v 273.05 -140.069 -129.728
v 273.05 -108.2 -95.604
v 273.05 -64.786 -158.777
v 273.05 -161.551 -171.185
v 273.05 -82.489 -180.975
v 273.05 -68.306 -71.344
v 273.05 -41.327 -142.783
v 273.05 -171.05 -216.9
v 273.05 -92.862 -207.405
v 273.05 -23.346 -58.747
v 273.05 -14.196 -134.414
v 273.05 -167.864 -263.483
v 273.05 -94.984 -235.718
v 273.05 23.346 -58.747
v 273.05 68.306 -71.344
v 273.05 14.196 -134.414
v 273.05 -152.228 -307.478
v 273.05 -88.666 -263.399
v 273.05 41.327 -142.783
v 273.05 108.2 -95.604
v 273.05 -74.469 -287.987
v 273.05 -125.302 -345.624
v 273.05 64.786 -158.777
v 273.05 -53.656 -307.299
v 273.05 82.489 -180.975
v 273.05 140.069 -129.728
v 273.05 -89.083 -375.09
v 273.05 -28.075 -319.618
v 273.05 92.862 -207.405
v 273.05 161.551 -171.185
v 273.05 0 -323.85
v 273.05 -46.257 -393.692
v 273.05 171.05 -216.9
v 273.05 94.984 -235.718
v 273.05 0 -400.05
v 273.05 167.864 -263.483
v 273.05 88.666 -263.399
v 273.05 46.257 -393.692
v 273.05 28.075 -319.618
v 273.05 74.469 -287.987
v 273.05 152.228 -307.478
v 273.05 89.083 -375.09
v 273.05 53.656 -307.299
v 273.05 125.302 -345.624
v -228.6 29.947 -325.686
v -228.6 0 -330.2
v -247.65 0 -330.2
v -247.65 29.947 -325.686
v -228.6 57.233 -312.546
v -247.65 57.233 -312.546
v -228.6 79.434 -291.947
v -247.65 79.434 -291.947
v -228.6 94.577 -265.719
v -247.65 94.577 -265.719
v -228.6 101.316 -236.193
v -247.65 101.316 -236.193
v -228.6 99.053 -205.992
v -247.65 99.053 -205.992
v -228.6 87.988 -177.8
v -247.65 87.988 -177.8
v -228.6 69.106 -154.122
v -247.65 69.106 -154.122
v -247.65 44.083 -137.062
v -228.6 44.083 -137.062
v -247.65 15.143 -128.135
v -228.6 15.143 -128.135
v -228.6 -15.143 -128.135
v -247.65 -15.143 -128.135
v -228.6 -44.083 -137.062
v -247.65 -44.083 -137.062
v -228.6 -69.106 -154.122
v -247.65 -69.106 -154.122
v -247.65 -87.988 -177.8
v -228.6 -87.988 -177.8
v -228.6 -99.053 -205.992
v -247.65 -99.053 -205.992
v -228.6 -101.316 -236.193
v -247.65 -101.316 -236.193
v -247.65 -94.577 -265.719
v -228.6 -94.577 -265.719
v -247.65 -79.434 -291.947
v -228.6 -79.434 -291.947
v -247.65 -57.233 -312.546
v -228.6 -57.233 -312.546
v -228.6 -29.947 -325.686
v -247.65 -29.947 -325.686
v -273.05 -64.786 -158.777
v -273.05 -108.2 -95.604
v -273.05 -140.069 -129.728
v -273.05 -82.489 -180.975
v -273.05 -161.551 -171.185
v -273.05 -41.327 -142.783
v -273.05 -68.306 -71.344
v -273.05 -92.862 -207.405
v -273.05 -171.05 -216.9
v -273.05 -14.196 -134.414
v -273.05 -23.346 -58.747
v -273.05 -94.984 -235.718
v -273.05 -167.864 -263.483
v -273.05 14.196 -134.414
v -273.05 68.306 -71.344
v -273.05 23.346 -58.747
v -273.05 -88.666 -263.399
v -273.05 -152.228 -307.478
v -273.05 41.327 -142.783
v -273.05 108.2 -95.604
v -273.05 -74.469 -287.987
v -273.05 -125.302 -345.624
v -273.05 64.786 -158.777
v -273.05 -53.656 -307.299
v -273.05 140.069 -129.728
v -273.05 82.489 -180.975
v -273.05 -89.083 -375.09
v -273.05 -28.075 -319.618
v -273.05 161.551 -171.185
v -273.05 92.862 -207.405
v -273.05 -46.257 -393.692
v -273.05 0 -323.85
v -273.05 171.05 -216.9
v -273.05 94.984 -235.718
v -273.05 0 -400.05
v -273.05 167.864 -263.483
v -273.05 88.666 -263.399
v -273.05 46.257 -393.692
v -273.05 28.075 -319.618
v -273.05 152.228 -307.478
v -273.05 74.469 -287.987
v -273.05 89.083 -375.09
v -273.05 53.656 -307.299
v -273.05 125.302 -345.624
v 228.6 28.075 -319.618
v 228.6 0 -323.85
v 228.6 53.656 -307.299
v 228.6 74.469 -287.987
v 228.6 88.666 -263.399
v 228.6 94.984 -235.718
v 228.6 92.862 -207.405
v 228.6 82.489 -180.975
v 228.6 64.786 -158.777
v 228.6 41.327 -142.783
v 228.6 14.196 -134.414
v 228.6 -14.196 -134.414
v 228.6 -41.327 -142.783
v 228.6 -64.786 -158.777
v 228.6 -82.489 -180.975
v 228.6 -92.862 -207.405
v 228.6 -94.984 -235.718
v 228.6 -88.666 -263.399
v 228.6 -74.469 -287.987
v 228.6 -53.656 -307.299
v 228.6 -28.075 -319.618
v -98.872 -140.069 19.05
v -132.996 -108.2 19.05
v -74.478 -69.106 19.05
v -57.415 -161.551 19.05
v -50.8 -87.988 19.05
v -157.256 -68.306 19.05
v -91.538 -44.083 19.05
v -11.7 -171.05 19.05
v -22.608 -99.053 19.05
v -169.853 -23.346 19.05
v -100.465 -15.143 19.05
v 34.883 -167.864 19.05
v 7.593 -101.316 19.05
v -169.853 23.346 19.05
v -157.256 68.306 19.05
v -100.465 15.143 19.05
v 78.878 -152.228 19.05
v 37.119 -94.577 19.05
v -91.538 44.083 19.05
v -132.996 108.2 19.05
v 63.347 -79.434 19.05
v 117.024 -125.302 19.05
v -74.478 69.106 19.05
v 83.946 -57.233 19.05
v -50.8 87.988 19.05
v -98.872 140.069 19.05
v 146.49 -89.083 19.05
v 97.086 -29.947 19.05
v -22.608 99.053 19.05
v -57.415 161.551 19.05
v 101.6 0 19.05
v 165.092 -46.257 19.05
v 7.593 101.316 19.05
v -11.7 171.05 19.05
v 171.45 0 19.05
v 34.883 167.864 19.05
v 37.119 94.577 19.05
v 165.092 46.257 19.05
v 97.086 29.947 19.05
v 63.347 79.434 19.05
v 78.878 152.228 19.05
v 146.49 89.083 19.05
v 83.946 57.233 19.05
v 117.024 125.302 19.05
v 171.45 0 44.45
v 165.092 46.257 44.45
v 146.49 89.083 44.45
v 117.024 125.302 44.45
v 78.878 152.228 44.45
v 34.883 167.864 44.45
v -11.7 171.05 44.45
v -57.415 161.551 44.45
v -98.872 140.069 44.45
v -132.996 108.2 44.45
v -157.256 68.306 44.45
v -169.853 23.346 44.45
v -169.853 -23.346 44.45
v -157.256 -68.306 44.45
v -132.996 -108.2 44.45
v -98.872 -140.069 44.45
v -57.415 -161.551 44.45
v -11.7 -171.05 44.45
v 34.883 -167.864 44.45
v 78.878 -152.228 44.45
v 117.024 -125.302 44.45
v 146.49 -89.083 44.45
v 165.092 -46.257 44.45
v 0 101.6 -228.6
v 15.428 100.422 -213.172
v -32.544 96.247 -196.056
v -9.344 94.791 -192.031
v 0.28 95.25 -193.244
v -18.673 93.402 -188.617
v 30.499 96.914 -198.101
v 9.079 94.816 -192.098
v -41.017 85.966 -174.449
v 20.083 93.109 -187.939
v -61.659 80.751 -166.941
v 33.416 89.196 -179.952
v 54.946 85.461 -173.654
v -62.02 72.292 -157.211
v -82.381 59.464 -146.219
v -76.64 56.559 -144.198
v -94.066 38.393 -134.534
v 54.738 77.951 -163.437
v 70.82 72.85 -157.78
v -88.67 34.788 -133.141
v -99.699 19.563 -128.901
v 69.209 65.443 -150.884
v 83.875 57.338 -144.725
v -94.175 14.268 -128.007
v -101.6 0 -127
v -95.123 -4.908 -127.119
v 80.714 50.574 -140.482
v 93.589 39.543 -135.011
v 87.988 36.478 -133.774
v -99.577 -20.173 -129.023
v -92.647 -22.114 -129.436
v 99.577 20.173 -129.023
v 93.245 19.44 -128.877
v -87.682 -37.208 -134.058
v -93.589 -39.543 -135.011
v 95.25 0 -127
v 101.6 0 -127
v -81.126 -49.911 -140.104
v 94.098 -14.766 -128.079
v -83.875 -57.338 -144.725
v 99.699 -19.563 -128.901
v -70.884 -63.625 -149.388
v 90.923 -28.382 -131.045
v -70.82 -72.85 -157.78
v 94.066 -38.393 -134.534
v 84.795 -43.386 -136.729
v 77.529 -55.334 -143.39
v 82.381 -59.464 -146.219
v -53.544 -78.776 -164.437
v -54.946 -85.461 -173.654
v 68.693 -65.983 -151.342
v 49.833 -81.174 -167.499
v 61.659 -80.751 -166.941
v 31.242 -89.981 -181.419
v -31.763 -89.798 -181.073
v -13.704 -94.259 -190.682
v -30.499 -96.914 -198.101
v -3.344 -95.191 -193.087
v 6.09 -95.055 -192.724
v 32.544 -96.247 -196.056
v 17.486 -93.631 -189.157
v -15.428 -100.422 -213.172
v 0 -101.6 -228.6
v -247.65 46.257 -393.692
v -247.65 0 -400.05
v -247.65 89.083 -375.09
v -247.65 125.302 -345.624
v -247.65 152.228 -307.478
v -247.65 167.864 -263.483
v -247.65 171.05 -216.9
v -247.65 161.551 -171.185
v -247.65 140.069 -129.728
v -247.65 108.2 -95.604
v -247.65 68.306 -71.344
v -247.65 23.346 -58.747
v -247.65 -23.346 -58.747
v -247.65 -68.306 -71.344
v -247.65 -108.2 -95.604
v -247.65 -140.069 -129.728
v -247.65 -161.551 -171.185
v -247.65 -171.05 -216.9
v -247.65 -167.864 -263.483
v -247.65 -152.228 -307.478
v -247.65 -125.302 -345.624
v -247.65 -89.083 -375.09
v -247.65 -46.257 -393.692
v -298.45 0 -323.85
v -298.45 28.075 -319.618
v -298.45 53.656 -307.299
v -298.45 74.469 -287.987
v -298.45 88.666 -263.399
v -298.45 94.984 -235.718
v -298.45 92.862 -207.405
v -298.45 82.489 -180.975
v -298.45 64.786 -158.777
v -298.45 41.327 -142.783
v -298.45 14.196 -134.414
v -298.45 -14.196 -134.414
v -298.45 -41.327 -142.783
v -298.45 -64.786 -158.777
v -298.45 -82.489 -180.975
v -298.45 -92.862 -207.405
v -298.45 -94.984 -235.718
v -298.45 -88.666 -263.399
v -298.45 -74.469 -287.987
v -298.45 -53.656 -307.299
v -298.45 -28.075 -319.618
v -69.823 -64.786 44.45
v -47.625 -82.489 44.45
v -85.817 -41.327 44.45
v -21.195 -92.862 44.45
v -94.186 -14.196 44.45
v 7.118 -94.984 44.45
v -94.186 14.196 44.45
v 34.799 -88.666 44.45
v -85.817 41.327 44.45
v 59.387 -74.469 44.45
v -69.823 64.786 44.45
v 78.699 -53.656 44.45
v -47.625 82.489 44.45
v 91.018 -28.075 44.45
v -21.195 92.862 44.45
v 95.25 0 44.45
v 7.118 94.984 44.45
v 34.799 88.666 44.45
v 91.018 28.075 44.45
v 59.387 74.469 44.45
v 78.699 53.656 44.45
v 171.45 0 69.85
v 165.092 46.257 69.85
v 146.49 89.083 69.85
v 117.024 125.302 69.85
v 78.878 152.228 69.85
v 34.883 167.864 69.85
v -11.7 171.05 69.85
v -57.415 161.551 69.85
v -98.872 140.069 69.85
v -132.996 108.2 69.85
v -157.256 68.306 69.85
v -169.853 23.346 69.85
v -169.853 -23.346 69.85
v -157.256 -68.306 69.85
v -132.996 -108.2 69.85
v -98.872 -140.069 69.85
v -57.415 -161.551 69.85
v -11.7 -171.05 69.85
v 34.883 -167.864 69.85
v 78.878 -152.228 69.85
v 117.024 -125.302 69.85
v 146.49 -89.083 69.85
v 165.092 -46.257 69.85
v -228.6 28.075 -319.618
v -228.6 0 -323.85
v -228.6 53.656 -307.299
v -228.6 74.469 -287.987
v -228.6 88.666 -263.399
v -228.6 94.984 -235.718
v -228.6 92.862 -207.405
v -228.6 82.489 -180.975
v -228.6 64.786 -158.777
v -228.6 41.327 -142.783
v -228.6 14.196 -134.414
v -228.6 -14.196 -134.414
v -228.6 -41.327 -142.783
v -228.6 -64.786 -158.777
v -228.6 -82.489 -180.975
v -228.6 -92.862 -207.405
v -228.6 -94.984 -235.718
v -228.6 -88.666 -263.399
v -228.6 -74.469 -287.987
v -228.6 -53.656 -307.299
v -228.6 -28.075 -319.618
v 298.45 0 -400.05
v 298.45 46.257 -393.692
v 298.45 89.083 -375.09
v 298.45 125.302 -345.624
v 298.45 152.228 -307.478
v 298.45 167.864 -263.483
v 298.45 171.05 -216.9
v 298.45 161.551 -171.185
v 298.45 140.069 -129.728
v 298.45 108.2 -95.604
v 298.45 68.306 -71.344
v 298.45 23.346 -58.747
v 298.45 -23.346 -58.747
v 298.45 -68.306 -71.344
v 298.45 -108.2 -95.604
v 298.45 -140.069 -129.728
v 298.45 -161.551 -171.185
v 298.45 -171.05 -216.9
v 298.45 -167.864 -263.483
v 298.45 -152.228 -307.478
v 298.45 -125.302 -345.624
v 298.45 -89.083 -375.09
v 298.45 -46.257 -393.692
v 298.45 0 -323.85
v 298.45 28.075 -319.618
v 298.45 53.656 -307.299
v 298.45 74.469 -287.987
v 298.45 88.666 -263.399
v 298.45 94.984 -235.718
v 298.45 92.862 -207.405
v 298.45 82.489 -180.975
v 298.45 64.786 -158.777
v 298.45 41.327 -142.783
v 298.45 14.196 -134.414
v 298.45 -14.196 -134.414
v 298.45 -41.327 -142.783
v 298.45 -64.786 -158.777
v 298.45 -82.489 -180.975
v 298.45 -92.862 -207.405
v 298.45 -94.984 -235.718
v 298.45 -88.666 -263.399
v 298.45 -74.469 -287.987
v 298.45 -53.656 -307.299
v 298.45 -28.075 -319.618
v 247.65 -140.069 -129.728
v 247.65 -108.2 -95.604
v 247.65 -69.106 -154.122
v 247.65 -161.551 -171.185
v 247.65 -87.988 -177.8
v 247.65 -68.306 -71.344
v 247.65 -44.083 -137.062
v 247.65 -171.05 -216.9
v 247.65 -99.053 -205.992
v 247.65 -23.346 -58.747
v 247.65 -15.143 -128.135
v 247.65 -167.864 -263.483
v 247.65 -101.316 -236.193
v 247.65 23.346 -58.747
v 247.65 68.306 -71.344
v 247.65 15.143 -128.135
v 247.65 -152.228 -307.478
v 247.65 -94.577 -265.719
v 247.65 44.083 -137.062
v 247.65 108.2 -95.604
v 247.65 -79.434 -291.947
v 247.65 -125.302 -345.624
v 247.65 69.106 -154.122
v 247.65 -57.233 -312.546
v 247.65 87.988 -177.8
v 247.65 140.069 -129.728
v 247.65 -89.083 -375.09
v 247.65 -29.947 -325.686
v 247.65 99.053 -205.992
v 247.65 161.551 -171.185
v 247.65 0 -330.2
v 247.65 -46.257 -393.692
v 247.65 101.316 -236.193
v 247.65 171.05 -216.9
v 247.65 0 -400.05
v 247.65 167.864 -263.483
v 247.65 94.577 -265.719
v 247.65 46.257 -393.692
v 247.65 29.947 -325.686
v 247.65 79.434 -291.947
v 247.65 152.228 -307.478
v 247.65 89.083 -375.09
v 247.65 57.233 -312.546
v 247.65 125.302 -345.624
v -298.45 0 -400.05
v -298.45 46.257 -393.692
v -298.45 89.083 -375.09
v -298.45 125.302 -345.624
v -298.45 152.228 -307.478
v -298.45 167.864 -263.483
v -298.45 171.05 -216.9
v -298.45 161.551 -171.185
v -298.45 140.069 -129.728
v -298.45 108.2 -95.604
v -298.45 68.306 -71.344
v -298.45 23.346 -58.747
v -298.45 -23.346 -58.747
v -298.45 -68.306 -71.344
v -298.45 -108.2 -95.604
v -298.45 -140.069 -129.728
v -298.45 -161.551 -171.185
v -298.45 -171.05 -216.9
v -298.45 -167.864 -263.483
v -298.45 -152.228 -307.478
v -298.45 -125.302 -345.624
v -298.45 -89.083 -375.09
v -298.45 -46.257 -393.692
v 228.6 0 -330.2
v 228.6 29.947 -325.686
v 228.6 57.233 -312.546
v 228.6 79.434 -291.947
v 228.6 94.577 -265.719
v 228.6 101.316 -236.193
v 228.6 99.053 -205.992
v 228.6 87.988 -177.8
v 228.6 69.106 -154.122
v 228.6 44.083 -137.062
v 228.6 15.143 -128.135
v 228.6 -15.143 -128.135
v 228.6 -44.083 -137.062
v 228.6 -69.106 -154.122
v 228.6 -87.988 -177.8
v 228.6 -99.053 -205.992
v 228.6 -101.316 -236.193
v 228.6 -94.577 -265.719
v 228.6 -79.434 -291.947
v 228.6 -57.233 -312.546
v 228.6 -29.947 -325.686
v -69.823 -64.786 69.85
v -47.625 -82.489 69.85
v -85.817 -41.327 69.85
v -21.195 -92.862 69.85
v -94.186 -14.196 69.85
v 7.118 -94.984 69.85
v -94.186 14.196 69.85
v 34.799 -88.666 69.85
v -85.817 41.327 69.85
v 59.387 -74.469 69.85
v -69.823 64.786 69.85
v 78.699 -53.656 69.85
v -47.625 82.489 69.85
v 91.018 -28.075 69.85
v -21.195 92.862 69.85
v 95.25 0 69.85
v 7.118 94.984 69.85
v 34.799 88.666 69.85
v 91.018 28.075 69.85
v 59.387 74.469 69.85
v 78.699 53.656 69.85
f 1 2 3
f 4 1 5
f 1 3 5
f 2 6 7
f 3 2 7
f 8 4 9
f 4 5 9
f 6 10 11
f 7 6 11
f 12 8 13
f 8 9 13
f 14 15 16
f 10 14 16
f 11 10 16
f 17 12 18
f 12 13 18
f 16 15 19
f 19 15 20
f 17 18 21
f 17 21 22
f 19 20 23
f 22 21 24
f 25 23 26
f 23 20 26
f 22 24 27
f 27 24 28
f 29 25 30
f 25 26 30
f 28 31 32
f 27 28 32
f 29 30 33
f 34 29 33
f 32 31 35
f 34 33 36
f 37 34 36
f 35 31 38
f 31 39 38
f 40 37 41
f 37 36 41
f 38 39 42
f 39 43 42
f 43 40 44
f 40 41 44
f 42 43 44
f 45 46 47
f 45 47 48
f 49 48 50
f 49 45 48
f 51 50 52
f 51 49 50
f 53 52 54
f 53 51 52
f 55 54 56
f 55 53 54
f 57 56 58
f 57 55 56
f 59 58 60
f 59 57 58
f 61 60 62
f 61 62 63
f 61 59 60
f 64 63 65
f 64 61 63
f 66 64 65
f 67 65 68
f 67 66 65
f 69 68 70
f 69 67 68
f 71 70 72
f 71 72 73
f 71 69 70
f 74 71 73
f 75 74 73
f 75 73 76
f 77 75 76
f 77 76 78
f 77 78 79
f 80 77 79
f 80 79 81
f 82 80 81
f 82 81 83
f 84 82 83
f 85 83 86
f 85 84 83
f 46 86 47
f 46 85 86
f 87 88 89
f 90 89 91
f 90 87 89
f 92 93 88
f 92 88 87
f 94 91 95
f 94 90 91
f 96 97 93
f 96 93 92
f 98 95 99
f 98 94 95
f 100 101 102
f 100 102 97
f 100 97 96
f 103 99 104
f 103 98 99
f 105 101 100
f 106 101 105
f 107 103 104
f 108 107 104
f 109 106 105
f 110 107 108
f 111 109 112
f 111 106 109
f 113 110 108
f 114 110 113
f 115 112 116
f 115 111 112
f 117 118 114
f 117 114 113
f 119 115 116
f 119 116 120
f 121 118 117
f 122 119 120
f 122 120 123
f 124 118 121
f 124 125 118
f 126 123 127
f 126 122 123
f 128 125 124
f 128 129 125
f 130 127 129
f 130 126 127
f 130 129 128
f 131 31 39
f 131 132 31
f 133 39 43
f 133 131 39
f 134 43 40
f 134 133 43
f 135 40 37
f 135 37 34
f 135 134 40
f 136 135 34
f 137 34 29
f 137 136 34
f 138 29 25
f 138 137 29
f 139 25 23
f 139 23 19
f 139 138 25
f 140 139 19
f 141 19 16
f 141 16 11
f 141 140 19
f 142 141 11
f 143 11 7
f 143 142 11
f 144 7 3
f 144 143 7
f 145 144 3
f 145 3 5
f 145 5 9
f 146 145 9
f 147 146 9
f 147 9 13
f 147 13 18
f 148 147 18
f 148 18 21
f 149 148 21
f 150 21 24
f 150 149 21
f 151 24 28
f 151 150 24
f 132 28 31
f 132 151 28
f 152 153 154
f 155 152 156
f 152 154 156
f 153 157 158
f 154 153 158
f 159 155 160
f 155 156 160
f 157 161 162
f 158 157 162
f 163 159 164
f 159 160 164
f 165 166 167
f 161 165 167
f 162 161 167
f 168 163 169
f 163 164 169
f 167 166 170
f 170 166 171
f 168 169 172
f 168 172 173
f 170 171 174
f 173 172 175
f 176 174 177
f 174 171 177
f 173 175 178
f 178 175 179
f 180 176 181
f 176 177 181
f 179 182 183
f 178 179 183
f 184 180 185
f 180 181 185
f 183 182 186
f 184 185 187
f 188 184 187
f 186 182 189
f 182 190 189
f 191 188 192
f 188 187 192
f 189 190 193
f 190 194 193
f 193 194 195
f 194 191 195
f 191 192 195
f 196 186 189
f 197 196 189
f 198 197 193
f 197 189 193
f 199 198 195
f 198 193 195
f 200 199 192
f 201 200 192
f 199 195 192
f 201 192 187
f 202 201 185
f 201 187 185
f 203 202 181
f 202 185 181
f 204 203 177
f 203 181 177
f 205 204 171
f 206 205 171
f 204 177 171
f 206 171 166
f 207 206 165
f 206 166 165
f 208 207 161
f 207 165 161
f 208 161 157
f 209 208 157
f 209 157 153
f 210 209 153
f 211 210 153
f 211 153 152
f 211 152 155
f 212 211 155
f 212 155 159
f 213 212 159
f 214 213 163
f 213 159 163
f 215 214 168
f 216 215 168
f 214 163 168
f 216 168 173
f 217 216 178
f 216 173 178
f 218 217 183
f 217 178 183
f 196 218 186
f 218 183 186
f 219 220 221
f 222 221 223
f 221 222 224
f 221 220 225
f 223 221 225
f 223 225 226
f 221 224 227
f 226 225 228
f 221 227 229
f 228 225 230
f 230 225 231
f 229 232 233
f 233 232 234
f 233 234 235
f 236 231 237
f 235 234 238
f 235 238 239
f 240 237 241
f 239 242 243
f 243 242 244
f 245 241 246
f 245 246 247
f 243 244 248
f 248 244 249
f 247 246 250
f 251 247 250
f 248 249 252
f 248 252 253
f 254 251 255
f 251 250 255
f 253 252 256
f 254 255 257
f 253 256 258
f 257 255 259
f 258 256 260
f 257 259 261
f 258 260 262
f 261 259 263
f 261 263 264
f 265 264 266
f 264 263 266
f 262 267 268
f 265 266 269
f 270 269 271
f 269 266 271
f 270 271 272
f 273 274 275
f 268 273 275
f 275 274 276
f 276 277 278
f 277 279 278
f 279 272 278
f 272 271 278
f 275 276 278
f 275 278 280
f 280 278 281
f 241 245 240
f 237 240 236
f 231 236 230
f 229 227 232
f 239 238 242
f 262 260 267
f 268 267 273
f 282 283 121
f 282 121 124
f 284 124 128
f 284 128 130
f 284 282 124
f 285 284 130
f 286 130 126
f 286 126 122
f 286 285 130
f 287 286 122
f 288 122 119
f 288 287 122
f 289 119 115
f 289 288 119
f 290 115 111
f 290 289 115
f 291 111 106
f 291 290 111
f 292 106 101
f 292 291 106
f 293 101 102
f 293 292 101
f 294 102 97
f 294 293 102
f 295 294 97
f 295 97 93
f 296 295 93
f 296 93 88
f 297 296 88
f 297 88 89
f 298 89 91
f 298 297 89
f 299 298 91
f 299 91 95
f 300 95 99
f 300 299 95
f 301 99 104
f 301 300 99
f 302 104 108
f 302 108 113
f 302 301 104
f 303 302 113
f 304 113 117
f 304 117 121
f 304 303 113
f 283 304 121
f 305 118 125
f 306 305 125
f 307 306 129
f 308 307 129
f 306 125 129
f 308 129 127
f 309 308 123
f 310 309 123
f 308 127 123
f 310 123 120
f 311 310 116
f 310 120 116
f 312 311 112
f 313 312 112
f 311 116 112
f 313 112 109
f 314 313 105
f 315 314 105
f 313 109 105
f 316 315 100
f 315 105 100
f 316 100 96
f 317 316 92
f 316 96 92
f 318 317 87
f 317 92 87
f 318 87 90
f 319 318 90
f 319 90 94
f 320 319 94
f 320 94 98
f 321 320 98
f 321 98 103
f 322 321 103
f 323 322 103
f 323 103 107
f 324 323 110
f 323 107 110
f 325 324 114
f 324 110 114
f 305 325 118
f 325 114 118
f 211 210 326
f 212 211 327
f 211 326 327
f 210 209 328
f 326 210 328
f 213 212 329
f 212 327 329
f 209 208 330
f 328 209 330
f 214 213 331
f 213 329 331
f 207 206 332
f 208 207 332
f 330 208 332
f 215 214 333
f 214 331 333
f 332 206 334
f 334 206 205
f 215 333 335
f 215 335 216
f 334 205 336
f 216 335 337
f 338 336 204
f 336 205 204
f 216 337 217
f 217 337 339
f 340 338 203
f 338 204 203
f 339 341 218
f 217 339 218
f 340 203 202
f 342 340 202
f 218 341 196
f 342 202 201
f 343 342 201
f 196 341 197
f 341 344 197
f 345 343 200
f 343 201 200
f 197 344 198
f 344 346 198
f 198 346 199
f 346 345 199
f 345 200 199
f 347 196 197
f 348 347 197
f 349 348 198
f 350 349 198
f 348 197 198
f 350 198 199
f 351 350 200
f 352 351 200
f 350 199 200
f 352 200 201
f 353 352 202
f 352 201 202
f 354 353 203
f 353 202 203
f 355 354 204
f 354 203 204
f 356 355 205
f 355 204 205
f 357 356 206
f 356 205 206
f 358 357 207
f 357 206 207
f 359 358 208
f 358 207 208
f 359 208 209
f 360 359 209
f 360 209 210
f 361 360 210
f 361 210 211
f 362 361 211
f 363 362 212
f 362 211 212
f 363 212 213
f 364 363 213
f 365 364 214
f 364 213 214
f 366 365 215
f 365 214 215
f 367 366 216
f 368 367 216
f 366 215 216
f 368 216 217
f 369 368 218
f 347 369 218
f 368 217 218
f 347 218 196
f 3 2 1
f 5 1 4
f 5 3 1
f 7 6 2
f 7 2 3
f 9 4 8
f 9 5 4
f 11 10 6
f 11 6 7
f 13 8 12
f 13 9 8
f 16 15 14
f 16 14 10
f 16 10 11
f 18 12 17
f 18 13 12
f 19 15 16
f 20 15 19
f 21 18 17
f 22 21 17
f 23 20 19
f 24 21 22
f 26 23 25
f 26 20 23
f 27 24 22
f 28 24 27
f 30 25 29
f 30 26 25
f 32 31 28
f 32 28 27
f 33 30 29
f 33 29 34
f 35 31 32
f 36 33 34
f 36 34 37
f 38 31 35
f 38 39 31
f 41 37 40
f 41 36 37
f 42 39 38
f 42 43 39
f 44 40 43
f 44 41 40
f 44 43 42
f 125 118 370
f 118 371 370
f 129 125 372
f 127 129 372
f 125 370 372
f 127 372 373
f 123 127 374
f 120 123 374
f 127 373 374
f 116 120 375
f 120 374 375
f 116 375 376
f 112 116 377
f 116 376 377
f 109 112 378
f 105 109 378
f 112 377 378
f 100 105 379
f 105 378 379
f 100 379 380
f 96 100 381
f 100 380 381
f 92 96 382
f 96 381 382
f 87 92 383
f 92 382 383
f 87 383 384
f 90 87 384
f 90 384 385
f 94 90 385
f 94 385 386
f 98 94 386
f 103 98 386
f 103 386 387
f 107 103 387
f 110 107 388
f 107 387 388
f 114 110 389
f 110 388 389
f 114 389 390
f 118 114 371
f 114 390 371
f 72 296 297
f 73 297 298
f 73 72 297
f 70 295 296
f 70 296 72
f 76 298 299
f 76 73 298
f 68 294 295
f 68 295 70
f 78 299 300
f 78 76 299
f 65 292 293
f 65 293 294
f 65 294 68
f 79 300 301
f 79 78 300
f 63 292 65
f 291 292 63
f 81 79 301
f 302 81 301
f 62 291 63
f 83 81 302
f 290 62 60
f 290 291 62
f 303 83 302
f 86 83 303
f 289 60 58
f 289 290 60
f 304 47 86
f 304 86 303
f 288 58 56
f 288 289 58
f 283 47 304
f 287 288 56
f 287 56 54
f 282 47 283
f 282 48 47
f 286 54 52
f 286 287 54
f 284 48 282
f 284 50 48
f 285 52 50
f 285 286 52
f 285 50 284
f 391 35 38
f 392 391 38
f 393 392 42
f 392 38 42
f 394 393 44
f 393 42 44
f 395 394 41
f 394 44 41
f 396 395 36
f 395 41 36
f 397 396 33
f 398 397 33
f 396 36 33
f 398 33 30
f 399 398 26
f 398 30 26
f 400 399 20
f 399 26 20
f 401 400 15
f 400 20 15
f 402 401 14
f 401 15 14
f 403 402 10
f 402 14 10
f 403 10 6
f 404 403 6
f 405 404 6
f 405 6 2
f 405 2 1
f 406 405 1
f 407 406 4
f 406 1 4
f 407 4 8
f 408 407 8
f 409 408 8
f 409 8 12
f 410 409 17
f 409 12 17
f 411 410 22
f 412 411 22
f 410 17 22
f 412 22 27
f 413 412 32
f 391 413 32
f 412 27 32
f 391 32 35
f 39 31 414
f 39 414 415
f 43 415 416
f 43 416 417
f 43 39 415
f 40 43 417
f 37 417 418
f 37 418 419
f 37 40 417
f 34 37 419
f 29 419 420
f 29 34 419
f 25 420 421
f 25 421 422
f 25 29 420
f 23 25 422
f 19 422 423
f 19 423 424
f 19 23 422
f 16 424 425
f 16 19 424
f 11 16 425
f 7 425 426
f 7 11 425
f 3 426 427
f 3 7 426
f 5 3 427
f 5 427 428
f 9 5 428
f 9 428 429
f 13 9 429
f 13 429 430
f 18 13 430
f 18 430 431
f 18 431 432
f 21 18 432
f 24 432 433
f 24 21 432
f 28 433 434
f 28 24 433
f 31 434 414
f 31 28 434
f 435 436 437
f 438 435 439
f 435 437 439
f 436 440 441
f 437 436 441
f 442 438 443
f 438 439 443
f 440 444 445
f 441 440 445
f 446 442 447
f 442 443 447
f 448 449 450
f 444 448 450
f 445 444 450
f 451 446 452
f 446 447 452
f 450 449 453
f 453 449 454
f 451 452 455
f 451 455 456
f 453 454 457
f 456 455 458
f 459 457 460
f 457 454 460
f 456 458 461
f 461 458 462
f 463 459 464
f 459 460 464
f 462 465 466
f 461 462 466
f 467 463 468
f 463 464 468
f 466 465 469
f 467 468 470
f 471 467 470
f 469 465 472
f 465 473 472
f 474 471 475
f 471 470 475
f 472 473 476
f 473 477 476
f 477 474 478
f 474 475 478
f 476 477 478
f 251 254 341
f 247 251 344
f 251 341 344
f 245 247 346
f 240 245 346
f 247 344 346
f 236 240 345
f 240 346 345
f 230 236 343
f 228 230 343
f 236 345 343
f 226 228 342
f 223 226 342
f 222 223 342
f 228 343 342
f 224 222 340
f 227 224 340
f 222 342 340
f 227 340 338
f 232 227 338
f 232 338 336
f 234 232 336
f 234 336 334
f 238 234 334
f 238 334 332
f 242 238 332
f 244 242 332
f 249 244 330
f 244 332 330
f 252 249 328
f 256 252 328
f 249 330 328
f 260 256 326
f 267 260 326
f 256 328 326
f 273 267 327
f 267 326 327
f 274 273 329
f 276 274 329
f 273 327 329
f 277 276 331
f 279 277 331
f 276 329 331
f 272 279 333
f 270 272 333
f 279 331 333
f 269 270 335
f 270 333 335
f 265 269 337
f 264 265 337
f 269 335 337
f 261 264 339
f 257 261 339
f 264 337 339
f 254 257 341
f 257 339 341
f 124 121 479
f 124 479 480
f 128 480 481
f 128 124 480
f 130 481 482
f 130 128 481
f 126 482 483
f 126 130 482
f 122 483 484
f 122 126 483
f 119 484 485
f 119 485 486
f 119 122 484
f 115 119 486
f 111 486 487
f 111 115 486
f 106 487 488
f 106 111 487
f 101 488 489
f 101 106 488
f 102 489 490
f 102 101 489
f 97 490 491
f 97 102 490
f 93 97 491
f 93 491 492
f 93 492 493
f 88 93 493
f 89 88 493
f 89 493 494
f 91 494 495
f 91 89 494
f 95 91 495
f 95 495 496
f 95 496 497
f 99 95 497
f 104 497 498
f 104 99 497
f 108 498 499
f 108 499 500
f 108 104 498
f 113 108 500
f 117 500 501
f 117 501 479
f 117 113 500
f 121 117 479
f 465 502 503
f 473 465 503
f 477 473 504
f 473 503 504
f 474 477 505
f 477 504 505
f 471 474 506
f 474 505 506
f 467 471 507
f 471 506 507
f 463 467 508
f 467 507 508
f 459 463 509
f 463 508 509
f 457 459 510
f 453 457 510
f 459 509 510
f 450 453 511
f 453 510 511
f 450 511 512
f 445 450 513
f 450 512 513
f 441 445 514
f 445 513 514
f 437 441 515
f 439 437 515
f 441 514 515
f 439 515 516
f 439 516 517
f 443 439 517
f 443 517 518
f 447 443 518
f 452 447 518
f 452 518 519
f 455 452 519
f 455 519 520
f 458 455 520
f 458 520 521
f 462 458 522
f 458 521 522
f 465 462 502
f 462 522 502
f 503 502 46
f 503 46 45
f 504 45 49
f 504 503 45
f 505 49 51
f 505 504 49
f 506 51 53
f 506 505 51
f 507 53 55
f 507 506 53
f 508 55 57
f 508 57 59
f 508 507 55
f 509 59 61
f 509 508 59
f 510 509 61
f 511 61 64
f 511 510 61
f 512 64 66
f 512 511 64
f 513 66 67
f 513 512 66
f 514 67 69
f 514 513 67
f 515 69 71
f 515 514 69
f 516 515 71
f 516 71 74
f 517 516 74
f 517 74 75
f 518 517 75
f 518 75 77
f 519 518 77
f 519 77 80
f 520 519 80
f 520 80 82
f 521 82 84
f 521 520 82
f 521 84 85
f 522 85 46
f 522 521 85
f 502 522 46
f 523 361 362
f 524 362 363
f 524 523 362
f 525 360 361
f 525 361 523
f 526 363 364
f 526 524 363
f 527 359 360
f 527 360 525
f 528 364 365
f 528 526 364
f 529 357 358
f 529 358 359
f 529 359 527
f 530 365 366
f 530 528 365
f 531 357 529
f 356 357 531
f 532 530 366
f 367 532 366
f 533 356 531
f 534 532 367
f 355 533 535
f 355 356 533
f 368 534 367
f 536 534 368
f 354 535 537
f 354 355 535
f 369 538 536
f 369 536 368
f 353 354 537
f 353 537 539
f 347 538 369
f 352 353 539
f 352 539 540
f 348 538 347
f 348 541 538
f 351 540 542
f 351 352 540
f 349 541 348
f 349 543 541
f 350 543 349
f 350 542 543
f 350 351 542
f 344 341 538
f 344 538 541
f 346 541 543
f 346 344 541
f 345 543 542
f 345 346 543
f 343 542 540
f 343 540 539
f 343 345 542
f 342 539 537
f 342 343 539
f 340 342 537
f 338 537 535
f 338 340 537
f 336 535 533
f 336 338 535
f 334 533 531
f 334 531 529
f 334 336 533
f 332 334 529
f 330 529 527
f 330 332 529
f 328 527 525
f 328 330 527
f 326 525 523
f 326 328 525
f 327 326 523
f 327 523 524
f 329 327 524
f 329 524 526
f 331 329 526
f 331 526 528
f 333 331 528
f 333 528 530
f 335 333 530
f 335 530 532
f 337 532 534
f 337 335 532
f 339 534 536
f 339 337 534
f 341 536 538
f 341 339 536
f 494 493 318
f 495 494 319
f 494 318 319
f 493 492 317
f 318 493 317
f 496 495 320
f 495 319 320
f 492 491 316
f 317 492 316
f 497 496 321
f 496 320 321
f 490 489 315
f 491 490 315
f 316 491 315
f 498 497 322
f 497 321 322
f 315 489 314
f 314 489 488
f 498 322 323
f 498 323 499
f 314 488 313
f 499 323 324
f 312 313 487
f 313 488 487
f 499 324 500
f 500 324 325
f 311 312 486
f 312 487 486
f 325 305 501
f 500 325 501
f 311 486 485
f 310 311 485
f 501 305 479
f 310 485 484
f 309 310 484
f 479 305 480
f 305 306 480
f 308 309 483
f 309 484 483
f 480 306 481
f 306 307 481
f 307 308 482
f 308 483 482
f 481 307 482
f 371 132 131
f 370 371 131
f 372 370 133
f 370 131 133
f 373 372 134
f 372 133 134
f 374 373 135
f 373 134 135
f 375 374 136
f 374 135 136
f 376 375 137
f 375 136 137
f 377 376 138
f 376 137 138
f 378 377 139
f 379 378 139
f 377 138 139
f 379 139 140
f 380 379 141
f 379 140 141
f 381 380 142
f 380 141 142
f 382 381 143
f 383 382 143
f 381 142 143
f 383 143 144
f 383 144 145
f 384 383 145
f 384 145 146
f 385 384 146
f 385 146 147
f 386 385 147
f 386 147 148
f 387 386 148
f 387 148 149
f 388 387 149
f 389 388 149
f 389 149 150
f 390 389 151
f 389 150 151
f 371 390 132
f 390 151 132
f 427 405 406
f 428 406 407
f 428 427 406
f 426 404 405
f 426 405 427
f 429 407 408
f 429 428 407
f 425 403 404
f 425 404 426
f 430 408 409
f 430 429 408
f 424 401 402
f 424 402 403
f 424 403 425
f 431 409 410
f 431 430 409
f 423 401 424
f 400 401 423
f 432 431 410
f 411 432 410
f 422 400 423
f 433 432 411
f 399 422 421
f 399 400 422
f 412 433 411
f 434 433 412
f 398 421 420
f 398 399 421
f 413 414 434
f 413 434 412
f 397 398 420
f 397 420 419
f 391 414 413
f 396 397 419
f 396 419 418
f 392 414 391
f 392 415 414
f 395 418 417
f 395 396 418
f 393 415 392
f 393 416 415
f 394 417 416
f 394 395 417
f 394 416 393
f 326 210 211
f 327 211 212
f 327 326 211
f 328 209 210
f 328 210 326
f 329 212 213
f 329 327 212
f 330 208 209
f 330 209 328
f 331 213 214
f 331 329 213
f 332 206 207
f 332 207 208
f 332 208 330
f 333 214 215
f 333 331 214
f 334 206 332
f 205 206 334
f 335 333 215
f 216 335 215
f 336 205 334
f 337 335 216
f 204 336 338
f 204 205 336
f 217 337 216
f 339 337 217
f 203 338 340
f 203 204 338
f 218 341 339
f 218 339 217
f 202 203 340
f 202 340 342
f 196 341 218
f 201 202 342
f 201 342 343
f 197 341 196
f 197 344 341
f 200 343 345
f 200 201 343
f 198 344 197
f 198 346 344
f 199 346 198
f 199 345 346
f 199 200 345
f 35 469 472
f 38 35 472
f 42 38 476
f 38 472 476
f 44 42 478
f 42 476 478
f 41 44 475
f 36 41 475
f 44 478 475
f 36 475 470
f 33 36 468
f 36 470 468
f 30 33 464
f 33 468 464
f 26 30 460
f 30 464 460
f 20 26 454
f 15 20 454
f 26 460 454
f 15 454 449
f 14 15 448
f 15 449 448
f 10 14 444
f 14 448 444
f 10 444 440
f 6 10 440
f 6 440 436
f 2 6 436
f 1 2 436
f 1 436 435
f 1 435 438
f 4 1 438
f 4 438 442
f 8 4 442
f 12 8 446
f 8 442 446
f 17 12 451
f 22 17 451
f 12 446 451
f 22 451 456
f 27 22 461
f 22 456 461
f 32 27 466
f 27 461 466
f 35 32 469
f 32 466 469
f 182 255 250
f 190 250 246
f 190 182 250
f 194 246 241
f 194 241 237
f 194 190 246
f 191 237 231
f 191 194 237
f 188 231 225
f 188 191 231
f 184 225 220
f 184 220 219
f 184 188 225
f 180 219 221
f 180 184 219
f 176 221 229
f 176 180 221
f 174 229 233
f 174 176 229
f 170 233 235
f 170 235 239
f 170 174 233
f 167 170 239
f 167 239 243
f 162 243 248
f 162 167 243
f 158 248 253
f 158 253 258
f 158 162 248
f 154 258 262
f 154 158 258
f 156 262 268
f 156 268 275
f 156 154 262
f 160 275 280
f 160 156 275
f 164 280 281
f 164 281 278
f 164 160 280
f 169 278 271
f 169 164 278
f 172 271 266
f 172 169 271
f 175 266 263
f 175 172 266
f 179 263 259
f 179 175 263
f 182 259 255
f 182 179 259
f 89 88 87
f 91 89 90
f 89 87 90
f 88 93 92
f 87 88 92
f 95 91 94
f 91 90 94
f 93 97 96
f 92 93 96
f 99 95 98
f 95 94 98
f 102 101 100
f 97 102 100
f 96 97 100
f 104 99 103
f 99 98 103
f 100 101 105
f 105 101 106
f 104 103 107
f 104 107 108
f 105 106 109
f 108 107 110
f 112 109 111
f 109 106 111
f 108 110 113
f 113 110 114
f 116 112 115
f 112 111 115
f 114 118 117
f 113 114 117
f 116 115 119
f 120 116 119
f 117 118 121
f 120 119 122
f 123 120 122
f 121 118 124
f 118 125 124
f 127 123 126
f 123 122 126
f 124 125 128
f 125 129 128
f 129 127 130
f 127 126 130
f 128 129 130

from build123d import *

# Parameters (mm, degrees)
F0_R      = 101.6
F0_R_2    = 95.25
F1_DEPTH  = 19.05
F2_R      = 171.45
F2_R_2    = 101.6
F2_R_3    = 95.25
F3_DEPTH  = 25.4
F9_ANGLE  = 90
F11_DEPTH = 457.2
F12_REACH = 687.4191958742
F13_DEPTH = 25.4
F14_DEPTH = 25.4
F15_DEPTH = 25.4


with BuildPart() as f1:
    # F0 (on Top) → F1 (new body)
    with BuildSketch(Plane.XY):
        Circle(F0_R)
        Circle(F0_R_2, mode=Mode.SUBTRACT)
    extrude(amount=F1_DEPTH)

    # F2 (on face) → F3 (join)
    with BuildSketch(Plane.XY.offset(19.05)):
        Circle(F2_R)
        Circle(F2_R_2, mode=Mode.SUBTRACT)
        Circle(F2_R_2)
        Circle(F2_R_3, mode=Mode.SUBTRACT)
    extrude(amount=F3_DEPTH)


with BuildPart() as f7_1:
    # F7: copy of F1
    add(f1.part.moved(Location((228.6, 0, -228.6))))


with BuildPart() as f7_1_1:
    # F9: moved
    add(f7_1.part.rotate(Axis((228.6, 122.1911609173, -228.6), (0, 1, 0)), F9_ANGLE))


with BuildPart() as f10_1:
    # F10: instance of F7_1
    add(f7_1_1.part.mirror(Plane.YZ))


with BuildPart() as f7_1_2:
    add(f7_1_1.part)

    # F11 (add, through all): a face of the model
    f11_faces = [f7_1_2.faces().sort_by_distance(p)[0] for p in [
        (228.6, 0, -129.8736819587),
    ]]

    add(f10_1.part)  # F11 merges F10_1
    extrude(f11_faces, amount=F11_DEPTH)


with BuildPart() as f1_1:
    add(f1.part)

    f12_end = f7_1_2.part.faces().sort_by_distance((0, 0, -127))[0]
    # F0 (on Top) → F12 (join, up to a face of F7_1 that its end follows)
    with BuildSketch(Plane.XY):
        Circle(F0_R)
        Circle(F0_R_2, mode=Mode.SUBTRACT)
    f12_long = extrude(amount=-F12_REACH, mode=Mode.PRIVATE)
    add(split(f12_long, bisect_by=f12_end, keep=Keep.ALL, mode=Mode.PRIVATE).solids().sort_by_distance((-98.7263180413, 0, 0))[0])


with BuildPart() as f13:
    # F13 (new): a face of the model
    f13_faces = [f1_1.part.faces().sort_by_distance(p)[0] for p in [
        (-166.6006616946, 0, 44.45),
    ]]
    extrude(f13_faces, amount=F13_DEPTH)


with BuildPart() as f14:
    # F14 (new): a face of the model
    f14_faces = [f7_1_2.part.faces().sort_by_distance(p)[0] for p in [
        (273.05, 0, -61.9993383054),
    ]]
    extrude(f14_faces, amount=F14_DEPTH)


with BuildPart() as f15:
    # F15 (new): a face of the model
    f15_faces = [f7_1_2.part.faces().sort_by_distance(p)[0] for p in [
        (-273.05, 0, -61.9993383054),
    ]]
    extrude(f15_faces, amount=F15_DEPTH)


solid = Compound([f7_1_2.part, f1_1.part, f13.part, f14.part, f15.part])
